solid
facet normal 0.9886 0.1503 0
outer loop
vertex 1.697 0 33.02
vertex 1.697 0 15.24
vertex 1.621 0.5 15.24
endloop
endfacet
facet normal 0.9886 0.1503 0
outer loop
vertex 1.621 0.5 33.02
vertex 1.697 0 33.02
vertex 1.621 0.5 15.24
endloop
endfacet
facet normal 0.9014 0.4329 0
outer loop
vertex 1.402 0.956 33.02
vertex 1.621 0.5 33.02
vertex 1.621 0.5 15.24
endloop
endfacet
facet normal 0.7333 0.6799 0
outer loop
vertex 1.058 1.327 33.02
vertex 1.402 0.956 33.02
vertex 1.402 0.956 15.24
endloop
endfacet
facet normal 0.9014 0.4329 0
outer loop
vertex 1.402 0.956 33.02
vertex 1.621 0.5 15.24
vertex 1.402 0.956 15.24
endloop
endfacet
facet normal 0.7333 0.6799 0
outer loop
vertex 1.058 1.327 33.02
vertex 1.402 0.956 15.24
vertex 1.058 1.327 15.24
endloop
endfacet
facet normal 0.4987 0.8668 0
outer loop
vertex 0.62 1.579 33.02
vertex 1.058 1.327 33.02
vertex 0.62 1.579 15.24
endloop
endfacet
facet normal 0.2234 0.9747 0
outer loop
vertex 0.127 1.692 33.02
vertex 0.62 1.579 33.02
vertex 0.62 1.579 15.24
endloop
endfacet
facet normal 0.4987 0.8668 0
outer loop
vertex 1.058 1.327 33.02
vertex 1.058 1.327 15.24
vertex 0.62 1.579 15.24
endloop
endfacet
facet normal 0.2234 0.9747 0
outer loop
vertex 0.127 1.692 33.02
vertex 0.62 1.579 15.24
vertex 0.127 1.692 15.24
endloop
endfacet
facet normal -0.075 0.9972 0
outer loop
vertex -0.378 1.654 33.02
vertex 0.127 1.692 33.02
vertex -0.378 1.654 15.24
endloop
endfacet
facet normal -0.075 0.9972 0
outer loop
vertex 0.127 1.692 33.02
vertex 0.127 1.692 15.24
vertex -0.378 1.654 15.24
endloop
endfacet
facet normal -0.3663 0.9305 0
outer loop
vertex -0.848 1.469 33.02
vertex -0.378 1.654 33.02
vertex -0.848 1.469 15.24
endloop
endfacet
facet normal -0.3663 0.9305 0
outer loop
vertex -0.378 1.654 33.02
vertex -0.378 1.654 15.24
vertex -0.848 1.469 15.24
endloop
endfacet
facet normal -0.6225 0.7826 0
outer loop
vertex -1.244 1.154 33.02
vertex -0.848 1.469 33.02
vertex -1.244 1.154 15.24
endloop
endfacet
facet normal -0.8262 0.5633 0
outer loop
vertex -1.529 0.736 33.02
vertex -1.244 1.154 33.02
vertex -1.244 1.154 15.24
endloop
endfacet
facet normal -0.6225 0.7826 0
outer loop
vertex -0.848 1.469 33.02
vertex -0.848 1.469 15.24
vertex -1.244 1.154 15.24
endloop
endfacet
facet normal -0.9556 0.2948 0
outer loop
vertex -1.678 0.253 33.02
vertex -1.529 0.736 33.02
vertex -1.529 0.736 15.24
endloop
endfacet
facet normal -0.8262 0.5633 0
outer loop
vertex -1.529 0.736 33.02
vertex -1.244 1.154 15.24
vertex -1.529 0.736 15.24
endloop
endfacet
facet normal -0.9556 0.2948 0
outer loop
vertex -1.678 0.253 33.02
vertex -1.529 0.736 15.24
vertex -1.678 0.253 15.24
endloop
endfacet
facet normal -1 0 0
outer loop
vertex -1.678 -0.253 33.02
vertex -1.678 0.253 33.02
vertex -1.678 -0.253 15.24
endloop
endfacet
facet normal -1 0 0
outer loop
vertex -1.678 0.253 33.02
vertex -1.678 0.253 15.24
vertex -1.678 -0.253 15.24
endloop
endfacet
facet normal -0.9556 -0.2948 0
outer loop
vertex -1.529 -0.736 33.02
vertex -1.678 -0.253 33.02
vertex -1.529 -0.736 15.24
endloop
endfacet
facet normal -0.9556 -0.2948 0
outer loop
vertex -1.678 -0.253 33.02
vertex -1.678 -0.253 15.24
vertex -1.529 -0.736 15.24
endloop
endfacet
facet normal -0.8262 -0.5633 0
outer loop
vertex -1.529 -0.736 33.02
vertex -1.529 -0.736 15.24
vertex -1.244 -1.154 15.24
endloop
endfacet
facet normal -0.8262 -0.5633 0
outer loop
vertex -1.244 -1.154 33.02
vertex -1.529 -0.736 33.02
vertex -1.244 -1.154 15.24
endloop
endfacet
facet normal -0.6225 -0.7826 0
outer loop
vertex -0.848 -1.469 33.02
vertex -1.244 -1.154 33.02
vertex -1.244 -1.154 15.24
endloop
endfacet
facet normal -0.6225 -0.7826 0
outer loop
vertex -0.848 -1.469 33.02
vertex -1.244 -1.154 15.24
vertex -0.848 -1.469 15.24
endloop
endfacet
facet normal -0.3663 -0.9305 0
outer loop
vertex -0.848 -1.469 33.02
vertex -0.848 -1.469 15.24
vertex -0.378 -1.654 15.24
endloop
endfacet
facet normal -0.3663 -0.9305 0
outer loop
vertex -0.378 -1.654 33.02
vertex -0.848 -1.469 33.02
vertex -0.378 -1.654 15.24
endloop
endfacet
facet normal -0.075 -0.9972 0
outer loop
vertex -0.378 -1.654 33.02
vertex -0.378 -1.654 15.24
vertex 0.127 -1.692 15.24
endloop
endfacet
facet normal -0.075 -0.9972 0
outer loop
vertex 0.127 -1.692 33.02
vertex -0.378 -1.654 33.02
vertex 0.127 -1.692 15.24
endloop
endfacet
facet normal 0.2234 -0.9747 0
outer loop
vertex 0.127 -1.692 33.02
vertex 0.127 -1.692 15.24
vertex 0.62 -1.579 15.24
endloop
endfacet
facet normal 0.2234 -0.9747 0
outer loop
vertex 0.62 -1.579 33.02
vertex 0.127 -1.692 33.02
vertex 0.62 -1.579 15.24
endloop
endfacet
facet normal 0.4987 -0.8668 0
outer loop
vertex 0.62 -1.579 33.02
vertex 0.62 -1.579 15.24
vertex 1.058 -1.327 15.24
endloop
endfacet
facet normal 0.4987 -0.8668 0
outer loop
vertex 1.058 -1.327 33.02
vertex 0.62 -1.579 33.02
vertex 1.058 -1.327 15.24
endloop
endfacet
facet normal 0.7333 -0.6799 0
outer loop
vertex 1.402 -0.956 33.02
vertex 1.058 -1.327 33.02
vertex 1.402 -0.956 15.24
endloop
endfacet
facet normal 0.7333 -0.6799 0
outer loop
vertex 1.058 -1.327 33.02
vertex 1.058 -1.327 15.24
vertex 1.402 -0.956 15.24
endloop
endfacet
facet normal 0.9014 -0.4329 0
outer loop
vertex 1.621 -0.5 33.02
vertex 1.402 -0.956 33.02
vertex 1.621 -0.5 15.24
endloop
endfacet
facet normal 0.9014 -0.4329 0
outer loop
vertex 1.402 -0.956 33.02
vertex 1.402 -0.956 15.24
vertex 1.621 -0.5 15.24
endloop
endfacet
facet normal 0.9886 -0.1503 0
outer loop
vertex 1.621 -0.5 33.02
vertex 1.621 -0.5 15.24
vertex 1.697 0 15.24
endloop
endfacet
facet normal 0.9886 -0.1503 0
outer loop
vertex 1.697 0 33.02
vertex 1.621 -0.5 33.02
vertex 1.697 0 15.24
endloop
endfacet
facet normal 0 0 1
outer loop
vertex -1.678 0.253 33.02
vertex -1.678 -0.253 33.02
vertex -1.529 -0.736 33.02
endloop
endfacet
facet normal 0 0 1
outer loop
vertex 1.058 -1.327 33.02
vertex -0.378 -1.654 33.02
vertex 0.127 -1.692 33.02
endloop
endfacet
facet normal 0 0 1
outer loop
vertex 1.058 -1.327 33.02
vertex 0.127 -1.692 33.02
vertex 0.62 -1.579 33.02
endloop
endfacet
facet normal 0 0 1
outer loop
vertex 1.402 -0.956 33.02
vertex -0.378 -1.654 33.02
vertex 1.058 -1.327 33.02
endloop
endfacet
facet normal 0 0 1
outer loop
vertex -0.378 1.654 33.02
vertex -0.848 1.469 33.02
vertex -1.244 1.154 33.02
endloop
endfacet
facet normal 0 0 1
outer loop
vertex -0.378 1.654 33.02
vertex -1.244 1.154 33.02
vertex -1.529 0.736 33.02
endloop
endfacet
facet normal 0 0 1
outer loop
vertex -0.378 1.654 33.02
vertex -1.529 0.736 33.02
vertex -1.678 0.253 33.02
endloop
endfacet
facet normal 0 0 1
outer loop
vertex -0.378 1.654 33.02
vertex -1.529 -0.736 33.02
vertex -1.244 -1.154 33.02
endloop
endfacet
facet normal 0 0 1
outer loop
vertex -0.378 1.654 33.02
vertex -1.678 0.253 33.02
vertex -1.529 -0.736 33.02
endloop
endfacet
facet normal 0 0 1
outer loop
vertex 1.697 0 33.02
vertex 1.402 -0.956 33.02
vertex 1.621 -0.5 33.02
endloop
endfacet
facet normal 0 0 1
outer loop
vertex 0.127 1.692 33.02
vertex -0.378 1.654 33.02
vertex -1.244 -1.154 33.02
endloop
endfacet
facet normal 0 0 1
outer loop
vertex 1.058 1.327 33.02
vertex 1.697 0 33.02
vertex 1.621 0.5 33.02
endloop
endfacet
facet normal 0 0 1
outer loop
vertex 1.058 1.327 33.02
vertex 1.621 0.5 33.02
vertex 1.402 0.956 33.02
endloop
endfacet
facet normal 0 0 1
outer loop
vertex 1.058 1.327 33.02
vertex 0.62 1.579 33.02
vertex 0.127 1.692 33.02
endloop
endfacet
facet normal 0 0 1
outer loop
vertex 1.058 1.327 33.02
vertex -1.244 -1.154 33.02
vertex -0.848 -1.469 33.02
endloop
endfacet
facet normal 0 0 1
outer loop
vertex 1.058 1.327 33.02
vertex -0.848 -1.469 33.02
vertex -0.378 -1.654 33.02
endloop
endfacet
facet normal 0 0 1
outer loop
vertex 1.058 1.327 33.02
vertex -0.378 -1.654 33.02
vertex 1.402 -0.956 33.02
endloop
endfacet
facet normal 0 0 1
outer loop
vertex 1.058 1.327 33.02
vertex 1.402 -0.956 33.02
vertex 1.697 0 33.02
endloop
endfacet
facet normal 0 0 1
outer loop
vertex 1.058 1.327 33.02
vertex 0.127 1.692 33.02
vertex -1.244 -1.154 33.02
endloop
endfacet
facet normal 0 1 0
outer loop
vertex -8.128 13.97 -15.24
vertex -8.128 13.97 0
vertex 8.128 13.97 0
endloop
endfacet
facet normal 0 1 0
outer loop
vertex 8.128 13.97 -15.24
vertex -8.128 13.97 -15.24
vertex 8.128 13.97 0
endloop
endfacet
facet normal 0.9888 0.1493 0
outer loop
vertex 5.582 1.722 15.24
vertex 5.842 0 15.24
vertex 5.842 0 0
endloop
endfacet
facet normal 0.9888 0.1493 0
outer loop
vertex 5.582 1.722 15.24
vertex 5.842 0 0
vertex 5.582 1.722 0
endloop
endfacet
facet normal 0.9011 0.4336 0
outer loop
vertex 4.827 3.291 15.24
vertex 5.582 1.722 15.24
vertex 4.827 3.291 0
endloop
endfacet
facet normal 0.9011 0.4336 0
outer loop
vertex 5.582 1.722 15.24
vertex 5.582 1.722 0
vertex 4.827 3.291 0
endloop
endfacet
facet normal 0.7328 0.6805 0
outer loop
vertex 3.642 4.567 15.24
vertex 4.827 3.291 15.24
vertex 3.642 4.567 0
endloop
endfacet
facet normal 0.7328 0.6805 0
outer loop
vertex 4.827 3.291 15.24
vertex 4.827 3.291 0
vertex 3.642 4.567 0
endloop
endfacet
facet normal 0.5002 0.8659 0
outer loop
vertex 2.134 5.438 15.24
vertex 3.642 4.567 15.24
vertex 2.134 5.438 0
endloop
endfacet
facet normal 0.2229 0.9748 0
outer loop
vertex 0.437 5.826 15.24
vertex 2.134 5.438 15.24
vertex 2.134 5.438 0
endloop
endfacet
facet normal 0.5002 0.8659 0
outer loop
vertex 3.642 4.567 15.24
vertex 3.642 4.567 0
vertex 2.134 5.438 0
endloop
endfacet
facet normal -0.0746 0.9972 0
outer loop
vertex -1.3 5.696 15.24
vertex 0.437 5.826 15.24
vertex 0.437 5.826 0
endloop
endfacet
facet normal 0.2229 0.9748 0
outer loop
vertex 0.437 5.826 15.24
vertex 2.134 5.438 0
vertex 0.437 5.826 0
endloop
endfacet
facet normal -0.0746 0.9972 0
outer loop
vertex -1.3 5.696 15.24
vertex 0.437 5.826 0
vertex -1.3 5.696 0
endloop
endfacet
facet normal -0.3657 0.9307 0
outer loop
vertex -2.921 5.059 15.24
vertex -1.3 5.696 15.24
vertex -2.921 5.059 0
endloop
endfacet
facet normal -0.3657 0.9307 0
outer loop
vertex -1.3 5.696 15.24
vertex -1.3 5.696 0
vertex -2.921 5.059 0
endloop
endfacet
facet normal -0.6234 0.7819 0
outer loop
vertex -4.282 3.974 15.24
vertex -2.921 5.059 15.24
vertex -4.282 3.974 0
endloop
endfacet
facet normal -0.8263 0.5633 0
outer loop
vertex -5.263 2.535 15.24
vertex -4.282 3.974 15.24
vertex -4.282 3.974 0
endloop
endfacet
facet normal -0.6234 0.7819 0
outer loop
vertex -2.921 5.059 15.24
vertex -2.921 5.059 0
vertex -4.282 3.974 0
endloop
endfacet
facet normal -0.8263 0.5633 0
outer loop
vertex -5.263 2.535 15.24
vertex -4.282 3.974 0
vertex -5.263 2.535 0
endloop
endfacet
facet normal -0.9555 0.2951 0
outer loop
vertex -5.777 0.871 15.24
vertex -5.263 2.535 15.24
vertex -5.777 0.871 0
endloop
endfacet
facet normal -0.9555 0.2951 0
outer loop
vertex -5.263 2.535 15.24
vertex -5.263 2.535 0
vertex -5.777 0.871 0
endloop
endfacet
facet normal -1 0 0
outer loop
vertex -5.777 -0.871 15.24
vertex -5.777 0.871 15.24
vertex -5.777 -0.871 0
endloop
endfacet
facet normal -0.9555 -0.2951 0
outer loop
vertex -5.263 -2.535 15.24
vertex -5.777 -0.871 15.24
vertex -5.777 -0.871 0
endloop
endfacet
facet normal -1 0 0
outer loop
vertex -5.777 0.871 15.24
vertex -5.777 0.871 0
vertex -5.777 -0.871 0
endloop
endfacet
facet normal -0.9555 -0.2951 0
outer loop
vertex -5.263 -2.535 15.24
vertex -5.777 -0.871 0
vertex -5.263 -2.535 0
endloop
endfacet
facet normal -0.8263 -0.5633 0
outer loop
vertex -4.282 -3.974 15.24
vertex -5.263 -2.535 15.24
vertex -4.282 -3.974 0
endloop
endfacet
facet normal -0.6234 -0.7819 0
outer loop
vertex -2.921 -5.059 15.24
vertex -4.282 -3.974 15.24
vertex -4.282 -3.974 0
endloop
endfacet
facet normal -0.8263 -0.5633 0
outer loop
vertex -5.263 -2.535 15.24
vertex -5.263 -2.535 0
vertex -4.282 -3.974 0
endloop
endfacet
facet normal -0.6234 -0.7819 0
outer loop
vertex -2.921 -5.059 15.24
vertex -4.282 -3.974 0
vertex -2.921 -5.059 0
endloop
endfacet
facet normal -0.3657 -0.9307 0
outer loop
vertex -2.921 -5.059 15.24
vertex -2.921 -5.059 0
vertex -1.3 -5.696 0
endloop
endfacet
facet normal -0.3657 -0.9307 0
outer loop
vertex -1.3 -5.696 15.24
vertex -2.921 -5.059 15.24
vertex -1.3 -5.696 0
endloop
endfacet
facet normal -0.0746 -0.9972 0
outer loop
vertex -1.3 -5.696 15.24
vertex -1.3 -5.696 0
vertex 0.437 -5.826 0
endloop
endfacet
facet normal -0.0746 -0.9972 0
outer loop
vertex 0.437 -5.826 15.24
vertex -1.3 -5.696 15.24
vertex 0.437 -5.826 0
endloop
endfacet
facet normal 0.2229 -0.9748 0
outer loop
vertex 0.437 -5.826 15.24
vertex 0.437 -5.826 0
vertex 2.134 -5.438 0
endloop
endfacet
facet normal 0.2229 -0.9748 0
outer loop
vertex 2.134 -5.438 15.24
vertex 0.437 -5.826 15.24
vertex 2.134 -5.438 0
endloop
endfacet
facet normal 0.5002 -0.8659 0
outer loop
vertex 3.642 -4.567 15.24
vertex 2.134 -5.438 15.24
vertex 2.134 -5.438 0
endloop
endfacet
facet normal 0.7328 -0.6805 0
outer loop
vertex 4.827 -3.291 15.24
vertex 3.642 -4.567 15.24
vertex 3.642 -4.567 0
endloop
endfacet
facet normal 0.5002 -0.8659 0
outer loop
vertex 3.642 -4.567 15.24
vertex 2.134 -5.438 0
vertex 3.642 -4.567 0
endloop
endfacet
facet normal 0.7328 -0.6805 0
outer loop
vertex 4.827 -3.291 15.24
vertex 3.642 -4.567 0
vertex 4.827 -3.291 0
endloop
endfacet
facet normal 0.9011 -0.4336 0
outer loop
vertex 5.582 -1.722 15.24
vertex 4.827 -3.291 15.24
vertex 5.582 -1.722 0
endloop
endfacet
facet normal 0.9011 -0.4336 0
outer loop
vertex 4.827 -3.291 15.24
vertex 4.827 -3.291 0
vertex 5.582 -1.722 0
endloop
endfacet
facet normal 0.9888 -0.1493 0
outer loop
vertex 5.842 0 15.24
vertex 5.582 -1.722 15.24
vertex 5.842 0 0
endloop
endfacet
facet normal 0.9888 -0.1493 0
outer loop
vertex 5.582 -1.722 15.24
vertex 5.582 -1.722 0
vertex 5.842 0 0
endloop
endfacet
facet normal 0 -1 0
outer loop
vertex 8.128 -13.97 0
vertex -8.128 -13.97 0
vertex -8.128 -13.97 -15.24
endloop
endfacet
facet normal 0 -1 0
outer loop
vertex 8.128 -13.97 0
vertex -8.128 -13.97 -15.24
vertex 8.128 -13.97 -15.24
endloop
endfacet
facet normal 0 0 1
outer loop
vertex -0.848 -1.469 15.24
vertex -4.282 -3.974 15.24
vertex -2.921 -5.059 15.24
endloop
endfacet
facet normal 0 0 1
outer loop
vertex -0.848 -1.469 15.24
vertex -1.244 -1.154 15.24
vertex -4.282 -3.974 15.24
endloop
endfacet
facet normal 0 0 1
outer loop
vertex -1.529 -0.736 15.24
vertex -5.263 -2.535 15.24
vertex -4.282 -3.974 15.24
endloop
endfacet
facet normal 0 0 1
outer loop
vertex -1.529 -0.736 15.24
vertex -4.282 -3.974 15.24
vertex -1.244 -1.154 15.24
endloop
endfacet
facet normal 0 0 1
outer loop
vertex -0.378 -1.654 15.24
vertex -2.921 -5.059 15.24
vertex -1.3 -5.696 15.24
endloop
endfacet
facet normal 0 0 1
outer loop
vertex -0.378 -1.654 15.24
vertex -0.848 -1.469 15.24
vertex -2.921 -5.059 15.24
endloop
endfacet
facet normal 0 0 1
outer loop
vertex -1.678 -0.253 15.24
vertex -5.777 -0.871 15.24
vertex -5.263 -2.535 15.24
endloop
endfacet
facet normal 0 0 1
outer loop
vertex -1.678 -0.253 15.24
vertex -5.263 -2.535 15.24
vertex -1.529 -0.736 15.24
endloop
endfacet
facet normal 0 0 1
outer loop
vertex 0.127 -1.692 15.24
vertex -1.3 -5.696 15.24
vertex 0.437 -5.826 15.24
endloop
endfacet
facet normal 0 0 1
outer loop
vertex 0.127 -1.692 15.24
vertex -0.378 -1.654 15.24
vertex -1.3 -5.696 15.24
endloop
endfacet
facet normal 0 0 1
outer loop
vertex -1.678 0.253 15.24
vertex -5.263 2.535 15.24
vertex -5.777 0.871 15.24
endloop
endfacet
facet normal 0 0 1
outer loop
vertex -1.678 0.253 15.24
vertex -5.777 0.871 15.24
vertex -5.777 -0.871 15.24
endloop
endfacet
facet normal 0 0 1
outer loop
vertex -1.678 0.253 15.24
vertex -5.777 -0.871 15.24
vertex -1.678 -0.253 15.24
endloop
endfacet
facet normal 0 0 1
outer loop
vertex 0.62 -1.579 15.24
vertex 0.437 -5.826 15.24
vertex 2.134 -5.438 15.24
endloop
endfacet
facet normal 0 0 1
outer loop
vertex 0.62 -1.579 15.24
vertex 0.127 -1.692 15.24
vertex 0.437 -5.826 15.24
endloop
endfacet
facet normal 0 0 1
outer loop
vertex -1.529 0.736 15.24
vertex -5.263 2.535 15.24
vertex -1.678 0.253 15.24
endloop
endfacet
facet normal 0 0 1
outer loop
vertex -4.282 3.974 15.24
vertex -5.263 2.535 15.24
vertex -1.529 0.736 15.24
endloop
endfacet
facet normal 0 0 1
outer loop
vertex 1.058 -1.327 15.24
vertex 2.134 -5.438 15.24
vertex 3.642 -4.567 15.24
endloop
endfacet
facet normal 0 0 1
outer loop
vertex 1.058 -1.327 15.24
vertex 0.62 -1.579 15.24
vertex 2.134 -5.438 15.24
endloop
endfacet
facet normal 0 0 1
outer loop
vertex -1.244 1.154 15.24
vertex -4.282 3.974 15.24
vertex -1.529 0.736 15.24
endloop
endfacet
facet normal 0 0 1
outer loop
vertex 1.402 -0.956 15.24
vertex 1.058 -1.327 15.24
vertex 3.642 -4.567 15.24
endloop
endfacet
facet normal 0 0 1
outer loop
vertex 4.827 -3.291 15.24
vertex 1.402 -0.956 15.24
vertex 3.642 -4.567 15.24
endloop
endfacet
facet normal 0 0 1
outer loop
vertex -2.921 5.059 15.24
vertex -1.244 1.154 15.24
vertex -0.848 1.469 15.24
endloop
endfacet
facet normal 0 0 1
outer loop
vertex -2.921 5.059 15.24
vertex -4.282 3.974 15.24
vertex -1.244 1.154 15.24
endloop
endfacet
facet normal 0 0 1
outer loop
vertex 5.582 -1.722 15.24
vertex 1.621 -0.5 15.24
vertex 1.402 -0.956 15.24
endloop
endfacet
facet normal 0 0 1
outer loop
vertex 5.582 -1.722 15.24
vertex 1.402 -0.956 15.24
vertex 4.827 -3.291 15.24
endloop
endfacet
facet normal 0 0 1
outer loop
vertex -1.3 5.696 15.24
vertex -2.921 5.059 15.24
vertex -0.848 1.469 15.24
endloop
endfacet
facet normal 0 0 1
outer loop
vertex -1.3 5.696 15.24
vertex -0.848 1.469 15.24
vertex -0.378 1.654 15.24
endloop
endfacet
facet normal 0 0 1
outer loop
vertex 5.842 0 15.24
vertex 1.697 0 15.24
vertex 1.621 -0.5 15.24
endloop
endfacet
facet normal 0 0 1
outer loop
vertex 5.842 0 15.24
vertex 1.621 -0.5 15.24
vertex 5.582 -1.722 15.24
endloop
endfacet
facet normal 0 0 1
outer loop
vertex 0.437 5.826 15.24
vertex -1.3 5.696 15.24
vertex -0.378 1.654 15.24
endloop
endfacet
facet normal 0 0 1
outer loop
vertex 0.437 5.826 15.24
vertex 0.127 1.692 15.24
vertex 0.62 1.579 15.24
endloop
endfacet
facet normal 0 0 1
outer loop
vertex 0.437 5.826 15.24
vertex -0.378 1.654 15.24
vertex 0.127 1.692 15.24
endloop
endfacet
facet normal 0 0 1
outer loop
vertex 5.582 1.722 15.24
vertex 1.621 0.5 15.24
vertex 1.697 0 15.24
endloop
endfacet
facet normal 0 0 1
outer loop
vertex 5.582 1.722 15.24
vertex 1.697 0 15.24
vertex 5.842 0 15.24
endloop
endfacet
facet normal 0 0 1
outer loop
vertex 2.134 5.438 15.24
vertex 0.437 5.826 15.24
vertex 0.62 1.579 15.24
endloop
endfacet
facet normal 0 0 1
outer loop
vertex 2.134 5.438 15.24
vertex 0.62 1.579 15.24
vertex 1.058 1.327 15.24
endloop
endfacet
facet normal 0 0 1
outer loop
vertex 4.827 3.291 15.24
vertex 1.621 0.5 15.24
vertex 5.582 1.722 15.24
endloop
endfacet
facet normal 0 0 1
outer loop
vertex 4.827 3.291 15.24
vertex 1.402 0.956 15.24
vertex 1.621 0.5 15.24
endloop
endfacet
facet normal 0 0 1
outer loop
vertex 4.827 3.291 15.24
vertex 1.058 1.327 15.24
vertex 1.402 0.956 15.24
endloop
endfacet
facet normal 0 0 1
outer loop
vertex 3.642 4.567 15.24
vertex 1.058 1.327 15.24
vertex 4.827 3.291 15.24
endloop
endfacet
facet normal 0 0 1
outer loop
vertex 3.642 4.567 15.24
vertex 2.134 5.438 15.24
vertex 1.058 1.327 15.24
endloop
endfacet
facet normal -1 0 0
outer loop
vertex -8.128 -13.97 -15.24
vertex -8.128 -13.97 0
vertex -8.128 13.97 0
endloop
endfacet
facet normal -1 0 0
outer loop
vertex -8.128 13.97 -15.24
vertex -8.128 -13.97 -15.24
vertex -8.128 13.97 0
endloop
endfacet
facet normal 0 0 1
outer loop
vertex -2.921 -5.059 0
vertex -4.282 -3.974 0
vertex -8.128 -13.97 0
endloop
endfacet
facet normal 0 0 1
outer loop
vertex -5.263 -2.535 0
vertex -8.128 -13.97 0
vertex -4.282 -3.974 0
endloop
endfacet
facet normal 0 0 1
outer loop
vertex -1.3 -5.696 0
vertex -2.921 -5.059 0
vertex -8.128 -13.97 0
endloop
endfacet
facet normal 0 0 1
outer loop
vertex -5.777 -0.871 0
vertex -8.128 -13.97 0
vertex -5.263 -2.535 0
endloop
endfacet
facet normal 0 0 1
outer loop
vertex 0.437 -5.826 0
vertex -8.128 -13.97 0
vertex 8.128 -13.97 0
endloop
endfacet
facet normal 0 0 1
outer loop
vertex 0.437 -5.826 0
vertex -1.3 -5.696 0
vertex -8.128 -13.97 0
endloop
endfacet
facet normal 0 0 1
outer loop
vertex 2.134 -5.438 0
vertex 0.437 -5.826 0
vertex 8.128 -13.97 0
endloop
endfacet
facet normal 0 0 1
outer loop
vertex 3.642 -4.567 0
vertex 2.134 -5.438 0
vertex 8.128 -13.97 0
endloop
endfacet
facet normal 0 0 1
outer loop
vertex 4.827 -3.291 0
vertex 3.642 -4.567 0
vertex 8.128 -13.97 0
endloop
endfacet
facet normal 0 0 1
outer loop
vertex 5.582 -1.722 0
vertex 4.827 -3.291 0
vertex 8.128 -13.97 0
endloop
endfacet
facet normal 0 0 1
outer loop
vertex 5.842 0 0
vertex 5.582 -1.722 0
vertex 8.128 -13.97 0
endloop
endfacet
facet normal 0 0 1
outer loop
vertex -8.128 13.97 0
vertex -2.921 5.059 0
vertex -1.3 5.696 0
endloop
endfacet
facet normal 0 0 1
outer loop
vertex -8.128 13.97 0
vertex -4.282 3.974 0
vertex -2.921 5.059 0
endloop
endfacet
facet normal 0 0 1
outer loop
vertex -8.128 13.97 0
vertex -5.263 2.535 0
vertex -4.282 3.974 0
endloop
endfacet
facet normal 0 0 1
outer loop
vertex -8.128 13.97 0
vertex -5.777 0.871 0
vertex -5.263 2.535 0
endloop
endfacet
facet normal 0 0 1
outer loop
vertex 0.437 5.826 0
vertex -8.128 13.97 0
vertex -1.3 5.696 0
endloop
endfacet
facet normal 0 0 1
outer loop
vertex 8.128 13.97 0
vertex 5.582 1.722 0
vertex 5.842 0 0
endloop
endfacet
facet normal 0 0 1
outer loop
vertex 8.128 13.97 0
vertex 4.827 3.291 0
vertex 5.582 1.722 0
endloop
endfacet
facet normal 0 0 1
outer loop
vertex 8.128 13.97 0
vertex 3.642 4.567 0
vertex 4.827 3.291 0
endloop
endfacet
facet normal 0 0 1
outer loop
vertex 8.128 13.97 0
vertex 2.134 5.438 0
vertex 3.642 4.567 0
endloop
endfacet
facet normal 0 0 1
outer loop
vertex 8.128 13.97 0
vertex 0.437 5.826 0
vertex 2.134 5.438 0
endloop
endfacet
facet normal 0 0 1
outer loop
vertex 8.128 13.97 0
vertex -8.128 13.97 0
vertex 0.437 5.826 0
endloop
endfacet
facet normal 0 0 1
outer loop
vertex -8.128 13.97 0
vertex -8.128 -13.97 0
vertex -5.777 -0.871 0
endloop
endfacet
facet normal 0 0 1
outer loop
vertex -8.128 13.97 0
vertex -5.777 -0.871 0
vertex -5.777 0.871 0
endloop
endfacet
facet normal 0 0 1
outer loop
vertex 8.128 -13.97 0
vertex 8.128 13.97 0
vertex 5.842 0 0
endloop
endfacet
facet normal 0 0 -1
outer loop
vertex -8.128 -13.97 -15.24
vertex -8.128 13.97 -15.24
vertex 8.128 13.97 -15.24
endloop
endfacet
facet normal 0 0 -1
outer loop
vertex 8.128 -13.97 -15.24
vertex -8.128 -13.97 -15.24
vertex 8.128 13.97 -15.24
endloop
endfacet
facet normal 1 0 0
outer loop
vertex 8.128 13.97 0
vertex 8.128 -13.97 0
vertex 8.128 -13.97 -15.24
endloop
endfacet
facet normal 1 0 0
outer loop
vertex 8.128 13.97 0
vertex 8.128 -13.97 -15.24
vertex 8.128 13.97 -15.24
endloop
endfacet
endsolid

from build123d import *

# Parameters (mm, degrees)
F0_R     = 5.842
F1_DEPTH = 15.24
F2_R     = 1.696679
F3_DEPTH = 17.78
F4_W     = 16.256
F4_H     = 27.940002
F5_DEPTH = 15.24


with BuildPart() as f1:
    # F0 (on Top) → F1 (new body)
    with BuildSketch(Plane.XY):
        Circle(F0_R)
    extrude(amount=F1_DEPTH)

    # F2 (on face) → F3 (join)
    with BuildSketch(Plane.XY.offset(15.24)):
        Circle(F2_R)
    extrude(amount=F3_DEPTH)

    # F4 (on Top) → F5 (join)
    with BuildSketch(Plane.XY):
        Rectangle(F4_W, F4_H)
    extrude(amount=-F5_DEPTH)


solid = f1.part
